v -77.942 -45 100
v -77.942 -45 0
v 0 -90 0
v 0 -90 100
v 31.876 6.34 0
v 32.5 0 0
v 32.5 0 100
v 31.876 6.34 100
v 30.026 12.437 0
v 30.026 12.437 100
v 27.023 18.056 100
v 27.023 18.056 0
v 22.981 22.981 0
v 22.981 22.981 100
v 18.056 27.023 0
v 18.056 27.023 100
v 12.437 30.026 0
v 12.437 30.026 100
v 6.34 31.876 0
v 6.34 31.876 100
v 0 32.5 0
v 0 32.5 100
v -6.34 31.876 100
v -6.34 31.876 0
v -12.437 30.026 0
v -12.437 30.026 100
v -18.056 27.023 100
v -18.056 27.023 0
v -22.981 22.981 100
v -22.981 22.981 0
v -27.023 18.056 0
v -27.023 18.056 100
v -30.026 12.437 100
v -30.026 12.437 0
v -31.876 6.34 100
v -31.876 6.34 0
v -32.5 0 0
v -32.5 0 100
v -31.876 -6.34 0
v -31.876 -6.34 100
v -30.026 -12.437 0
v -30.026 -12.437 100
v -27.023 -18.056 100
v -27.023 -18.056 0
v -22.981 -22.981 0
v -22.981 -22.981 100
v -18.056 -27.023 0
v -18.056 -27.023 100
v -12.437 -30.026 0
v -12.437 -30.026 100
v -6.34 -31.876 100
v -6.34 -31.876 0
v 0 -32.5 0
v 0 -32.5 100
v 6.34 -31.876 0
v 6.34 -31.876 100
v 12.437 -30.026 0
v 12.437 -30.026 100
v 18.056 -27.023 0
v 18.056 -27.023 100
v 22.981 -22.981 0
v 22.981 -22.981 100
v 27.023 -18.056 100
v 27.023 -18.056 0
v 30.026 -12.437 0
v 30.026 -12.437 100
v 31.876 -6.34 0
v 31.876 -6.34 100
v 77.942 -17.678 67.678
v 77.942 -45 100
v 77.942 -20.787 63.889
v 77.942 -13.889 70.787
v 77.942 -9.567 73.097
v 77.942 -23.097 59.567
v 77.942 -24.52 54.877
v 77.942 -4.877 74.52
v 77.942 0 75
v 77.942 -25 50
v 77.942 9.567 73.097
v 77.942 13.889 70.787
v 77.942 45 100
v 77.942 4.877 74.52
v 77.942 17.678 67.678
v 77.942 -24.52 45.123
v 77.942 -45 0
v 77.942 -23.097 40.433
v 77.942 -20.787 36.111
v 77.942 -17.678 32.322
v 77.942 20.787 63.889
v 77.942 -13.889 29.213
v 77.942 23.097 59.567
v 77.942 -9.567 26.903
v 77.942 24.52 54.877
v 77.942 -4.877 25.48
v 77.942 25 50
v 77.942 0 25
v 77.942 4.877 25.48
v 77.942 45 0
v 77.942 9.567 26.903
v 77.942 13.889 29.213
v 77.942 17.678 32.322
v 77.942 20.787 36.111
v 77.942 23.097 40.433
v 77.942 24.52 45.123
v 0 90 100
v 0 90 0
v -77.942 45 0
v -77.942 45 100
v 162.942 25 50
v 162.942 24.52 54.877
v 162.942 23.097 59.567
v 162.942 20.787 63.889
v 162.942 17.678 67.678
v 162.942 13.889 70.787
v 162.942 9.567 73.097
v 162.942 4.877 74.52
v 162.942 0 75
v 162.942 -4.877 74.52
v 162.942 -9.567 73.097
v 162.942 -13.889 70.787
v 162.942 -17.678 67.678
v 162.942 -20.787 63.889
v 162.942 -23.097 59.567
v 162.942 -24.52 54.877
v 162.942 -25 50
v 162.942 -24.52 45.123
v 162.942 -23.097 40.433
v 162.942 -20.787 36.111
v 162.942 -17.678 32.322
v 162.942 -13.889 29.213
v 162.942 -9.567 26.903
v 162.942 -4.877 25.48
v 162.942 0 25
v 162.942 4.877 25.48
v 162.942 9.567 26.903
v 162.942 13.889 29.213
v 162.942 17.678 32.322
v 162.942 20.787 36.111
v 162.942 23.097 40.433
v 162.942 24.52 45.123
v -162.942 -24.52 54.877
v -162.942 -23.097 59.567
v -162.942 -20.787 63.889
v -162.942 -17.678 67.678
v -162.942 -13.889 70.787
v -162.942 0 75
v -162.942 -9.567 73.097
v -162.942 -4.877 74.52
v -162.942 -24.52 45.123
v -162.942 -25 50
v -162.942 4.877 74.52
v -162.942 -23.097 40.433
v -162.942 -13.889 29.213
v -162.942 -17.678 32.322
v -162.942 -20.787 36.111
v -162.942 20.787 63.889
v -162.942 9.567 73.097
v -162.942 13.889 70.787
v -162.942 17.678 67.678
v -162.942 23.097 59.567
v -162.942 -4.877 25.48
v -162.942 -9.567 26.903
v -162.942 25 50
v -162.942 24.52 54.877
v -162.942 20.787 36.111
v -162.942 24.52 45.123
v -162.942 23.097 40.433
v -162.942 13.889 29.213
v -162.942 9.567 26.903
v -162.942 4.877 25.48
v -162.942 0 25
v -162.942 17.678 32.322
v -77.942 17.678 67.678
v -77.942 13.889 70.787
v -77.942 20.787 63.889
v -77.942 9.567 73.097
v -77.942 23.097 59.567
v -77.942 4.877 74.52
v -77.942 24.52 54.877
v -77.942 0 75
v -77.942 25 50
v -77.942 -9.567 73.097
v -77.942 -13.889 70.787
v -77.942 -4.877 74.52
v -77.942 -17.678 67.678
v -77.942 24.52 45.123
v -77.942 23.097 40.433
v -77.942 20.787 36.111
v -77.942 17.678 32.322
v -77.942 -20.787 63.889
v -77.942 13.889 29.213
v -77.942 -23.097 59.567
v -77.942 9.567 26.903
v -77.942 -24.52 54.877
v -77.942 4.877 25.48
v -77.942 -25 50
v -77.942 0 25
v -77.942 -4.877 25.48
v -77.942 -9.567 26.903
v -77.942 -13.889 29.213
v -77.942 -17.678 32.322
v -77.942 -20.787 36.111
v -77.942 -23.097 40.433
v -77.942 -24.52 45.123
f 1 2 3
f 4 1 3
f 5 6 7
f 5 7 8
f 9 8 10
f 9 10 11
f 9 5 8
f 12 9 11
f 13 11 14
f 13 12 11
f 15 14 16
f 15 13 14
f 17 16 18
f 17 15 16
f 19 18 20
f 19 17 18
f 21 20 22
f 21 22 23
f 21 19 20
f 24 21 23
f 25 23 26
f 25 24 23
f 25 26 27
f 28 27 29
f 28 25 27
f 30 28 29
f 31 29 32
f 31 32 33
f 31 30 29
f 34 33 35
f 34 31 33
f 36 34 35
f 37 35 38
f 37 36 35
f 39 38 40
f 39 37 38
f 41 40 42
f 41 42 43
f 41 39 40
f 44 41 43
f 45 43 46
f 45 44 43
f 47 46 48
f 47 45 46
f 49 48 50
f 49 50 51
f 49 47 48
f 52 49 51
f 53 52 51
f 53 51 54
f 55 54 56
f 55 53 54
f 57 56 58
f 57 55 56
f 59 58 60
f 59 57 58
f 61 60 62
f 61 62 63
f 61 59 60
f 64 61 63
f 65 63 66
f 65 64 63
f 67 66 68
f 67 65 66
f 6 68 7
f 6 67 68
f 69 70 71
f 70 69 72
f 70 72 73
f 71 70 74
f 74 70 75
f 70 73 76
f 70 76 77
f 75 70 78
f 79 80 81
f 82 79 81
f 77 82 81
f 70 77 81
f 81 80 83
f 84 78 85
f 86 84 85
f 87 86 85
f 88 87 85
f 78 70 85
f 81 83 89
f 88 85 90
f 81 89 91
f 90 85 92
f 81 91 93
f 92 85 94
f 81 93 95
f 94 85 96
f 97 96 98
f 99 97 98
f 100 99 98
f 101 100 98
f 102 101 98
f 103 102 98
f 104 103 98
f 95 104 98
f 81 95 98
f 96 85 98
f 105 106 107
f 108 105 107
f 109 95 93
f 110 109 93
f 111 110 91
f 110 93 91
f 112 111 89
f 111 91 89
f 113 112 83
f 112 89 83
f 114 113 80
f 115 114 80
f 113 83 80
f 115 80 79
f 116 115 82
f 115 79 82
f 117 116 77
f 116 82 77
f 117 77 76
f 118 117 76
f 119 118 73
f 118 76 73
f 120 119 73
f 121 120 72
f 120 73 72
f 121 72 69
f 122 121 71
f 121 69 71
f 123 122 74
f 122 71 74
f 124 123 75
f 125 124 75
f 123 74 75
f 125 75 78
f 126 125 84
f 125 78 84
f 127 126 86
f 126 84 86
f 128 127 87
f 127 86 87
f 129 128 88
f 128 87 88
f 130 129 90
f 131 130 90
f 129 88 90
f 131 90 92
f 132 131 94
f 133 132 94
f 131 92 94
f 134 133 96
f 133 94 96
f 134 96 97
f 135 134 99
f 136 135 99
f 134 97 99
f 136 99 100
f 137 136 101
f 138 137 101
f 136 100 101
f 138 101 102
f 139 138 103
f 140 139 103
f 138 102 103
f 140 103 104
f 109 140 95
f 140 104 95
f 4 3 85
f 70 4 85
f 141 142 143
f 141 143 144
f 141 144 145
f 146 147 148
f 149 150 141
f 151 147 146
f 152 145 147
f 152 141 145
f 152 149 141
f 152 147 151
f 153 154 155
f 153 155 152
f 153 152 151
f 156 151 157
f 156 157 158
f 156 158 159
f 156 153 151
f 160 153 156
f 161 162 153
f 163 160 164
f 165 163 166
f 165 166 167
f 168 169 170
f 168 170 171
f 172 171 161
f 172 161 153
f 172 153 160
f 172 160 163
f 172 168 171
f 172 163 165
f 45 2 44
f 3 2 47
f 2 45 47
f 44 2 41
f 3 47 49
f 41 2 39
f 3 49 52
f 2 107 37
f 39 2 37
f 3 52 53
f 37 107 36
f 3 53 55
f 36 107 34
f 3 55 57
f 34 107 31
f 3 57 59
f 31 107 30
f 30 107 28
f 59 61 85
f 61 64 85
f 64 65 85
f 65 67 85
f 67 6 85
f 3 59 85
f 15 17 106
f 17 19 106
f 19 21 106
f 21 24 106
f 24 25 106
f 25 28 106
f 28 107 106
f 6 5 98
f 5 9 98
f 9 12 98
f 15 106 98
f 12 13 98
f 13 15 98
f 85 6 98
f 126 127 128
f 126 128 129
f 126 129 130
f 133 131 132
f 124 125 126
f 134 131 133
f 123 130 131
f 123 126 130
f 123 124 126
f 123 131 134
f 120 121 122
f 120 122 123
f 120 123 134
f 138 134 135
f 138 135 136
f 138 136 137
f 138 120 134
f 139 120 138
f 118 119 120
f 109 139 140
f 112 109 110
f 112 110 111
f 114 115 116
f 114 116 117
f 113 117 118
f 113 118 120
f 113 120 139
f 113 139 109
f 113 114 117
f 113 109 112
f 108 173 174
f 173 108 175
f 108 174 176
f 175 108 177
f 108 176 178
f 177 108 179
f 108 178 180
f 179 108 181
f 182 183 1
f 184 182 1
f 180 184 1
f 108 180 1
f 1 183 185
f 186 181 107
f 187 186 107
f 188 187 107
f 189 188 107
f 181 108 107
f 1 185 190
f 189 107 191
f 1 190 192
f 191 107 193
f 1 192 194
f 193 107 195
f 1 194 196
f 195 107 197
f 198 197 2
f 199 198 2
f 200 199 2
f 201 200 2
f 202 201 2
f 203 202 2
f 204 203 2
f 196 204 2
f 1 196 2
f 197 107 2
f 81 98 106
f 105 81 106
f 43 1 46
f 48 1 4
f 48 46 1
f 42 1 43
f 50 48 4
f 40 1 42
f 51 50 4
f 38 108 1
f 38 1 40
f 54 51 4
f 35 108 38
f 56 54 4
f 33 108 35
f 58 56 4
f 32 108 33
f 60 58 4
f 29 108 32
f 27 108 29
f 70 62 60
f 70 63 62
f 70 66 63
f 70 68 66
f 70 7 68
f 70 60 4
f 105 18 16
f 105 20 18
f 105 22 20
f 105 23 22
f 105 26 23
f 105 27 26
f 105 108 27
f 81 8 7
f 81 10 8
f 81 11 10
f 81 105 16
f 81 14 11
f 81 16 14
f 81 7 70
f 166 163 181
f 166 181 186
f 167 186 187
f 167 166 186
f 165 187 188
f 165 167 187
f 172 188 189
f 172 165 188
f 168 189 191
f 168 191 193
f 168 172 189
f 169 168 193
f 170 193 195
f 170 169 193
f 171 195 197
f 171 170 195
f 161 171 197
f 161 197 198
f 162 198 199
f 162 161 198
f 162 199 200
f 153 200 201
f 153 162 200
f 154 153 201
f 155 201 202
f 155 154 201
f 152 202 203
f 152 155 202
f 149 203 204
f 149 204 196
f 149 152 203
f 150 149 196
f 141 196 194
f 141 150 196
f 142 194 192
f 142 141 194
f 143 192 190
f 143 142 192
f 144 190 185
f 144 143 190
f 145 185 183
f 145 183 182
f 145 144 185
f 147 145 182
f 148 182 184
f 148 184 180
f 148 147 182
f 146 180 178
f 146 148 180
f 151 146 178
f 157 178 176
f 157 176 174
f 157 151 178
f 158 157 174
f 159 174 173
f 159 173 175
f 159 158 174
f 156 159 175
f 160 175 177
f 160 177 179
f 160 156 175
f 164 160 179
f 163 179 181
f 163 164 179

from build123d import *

# Parameters (mm, degrees)
SKETCH1_R           = 32.5
BOSS_EXTRUDE1_DEPTH = 100
SKETCH2_R           = 25
BOSS_EXTRUDE2_DEPTH = 85
BOSS_EXTRUDE3_START = 85
SKETCH3_R           = 25
BOSS_EXTRUDE3_DEPTH = 85


with BuildPart() as part:
    # Sketch1 → Boss-Extrude1 (new body)
    with BuildSketch(Plane.XY):
        Polygon((0, -90), (77.942286341, -45), (77.942286341, 45), (0, 90), (-77.942286341, 45), (-77.942286341, -45), align=None)
        Circle(SKETCH1_R, mode=Mode.SUBTRACT)
    extrude(amount=BOSS_EXTRUDE1_DEPTH)

    # Sketch2 → Boss-Extrude2 (add)
    with BuildSketch(Plane(origin=(77.942286341, 0, 0), x_dir=(0, 0, -1), z_dir=(1, 0, 0))):
        with Locations(Location((-50, 0, 0), (0, 0, 90))):
            Circle(SKETCH2_R)
    extrude(amount=BOSS_EXTRUDE2_DEPTH)

    # Sketch3 → Boss-Extrude3 (add)
    with BuildSketch(Plane.ZY.offset(77.942286341).offset(BOSS_EXTRUDE3_START)):
        with Locations(Location((50, 0, 0), (0, 0, 90))):
            Circle(SKETCH3_R)
    extrude(amount=-BOSS_EXTRUDE3_DEPTH)


solid = part.part
